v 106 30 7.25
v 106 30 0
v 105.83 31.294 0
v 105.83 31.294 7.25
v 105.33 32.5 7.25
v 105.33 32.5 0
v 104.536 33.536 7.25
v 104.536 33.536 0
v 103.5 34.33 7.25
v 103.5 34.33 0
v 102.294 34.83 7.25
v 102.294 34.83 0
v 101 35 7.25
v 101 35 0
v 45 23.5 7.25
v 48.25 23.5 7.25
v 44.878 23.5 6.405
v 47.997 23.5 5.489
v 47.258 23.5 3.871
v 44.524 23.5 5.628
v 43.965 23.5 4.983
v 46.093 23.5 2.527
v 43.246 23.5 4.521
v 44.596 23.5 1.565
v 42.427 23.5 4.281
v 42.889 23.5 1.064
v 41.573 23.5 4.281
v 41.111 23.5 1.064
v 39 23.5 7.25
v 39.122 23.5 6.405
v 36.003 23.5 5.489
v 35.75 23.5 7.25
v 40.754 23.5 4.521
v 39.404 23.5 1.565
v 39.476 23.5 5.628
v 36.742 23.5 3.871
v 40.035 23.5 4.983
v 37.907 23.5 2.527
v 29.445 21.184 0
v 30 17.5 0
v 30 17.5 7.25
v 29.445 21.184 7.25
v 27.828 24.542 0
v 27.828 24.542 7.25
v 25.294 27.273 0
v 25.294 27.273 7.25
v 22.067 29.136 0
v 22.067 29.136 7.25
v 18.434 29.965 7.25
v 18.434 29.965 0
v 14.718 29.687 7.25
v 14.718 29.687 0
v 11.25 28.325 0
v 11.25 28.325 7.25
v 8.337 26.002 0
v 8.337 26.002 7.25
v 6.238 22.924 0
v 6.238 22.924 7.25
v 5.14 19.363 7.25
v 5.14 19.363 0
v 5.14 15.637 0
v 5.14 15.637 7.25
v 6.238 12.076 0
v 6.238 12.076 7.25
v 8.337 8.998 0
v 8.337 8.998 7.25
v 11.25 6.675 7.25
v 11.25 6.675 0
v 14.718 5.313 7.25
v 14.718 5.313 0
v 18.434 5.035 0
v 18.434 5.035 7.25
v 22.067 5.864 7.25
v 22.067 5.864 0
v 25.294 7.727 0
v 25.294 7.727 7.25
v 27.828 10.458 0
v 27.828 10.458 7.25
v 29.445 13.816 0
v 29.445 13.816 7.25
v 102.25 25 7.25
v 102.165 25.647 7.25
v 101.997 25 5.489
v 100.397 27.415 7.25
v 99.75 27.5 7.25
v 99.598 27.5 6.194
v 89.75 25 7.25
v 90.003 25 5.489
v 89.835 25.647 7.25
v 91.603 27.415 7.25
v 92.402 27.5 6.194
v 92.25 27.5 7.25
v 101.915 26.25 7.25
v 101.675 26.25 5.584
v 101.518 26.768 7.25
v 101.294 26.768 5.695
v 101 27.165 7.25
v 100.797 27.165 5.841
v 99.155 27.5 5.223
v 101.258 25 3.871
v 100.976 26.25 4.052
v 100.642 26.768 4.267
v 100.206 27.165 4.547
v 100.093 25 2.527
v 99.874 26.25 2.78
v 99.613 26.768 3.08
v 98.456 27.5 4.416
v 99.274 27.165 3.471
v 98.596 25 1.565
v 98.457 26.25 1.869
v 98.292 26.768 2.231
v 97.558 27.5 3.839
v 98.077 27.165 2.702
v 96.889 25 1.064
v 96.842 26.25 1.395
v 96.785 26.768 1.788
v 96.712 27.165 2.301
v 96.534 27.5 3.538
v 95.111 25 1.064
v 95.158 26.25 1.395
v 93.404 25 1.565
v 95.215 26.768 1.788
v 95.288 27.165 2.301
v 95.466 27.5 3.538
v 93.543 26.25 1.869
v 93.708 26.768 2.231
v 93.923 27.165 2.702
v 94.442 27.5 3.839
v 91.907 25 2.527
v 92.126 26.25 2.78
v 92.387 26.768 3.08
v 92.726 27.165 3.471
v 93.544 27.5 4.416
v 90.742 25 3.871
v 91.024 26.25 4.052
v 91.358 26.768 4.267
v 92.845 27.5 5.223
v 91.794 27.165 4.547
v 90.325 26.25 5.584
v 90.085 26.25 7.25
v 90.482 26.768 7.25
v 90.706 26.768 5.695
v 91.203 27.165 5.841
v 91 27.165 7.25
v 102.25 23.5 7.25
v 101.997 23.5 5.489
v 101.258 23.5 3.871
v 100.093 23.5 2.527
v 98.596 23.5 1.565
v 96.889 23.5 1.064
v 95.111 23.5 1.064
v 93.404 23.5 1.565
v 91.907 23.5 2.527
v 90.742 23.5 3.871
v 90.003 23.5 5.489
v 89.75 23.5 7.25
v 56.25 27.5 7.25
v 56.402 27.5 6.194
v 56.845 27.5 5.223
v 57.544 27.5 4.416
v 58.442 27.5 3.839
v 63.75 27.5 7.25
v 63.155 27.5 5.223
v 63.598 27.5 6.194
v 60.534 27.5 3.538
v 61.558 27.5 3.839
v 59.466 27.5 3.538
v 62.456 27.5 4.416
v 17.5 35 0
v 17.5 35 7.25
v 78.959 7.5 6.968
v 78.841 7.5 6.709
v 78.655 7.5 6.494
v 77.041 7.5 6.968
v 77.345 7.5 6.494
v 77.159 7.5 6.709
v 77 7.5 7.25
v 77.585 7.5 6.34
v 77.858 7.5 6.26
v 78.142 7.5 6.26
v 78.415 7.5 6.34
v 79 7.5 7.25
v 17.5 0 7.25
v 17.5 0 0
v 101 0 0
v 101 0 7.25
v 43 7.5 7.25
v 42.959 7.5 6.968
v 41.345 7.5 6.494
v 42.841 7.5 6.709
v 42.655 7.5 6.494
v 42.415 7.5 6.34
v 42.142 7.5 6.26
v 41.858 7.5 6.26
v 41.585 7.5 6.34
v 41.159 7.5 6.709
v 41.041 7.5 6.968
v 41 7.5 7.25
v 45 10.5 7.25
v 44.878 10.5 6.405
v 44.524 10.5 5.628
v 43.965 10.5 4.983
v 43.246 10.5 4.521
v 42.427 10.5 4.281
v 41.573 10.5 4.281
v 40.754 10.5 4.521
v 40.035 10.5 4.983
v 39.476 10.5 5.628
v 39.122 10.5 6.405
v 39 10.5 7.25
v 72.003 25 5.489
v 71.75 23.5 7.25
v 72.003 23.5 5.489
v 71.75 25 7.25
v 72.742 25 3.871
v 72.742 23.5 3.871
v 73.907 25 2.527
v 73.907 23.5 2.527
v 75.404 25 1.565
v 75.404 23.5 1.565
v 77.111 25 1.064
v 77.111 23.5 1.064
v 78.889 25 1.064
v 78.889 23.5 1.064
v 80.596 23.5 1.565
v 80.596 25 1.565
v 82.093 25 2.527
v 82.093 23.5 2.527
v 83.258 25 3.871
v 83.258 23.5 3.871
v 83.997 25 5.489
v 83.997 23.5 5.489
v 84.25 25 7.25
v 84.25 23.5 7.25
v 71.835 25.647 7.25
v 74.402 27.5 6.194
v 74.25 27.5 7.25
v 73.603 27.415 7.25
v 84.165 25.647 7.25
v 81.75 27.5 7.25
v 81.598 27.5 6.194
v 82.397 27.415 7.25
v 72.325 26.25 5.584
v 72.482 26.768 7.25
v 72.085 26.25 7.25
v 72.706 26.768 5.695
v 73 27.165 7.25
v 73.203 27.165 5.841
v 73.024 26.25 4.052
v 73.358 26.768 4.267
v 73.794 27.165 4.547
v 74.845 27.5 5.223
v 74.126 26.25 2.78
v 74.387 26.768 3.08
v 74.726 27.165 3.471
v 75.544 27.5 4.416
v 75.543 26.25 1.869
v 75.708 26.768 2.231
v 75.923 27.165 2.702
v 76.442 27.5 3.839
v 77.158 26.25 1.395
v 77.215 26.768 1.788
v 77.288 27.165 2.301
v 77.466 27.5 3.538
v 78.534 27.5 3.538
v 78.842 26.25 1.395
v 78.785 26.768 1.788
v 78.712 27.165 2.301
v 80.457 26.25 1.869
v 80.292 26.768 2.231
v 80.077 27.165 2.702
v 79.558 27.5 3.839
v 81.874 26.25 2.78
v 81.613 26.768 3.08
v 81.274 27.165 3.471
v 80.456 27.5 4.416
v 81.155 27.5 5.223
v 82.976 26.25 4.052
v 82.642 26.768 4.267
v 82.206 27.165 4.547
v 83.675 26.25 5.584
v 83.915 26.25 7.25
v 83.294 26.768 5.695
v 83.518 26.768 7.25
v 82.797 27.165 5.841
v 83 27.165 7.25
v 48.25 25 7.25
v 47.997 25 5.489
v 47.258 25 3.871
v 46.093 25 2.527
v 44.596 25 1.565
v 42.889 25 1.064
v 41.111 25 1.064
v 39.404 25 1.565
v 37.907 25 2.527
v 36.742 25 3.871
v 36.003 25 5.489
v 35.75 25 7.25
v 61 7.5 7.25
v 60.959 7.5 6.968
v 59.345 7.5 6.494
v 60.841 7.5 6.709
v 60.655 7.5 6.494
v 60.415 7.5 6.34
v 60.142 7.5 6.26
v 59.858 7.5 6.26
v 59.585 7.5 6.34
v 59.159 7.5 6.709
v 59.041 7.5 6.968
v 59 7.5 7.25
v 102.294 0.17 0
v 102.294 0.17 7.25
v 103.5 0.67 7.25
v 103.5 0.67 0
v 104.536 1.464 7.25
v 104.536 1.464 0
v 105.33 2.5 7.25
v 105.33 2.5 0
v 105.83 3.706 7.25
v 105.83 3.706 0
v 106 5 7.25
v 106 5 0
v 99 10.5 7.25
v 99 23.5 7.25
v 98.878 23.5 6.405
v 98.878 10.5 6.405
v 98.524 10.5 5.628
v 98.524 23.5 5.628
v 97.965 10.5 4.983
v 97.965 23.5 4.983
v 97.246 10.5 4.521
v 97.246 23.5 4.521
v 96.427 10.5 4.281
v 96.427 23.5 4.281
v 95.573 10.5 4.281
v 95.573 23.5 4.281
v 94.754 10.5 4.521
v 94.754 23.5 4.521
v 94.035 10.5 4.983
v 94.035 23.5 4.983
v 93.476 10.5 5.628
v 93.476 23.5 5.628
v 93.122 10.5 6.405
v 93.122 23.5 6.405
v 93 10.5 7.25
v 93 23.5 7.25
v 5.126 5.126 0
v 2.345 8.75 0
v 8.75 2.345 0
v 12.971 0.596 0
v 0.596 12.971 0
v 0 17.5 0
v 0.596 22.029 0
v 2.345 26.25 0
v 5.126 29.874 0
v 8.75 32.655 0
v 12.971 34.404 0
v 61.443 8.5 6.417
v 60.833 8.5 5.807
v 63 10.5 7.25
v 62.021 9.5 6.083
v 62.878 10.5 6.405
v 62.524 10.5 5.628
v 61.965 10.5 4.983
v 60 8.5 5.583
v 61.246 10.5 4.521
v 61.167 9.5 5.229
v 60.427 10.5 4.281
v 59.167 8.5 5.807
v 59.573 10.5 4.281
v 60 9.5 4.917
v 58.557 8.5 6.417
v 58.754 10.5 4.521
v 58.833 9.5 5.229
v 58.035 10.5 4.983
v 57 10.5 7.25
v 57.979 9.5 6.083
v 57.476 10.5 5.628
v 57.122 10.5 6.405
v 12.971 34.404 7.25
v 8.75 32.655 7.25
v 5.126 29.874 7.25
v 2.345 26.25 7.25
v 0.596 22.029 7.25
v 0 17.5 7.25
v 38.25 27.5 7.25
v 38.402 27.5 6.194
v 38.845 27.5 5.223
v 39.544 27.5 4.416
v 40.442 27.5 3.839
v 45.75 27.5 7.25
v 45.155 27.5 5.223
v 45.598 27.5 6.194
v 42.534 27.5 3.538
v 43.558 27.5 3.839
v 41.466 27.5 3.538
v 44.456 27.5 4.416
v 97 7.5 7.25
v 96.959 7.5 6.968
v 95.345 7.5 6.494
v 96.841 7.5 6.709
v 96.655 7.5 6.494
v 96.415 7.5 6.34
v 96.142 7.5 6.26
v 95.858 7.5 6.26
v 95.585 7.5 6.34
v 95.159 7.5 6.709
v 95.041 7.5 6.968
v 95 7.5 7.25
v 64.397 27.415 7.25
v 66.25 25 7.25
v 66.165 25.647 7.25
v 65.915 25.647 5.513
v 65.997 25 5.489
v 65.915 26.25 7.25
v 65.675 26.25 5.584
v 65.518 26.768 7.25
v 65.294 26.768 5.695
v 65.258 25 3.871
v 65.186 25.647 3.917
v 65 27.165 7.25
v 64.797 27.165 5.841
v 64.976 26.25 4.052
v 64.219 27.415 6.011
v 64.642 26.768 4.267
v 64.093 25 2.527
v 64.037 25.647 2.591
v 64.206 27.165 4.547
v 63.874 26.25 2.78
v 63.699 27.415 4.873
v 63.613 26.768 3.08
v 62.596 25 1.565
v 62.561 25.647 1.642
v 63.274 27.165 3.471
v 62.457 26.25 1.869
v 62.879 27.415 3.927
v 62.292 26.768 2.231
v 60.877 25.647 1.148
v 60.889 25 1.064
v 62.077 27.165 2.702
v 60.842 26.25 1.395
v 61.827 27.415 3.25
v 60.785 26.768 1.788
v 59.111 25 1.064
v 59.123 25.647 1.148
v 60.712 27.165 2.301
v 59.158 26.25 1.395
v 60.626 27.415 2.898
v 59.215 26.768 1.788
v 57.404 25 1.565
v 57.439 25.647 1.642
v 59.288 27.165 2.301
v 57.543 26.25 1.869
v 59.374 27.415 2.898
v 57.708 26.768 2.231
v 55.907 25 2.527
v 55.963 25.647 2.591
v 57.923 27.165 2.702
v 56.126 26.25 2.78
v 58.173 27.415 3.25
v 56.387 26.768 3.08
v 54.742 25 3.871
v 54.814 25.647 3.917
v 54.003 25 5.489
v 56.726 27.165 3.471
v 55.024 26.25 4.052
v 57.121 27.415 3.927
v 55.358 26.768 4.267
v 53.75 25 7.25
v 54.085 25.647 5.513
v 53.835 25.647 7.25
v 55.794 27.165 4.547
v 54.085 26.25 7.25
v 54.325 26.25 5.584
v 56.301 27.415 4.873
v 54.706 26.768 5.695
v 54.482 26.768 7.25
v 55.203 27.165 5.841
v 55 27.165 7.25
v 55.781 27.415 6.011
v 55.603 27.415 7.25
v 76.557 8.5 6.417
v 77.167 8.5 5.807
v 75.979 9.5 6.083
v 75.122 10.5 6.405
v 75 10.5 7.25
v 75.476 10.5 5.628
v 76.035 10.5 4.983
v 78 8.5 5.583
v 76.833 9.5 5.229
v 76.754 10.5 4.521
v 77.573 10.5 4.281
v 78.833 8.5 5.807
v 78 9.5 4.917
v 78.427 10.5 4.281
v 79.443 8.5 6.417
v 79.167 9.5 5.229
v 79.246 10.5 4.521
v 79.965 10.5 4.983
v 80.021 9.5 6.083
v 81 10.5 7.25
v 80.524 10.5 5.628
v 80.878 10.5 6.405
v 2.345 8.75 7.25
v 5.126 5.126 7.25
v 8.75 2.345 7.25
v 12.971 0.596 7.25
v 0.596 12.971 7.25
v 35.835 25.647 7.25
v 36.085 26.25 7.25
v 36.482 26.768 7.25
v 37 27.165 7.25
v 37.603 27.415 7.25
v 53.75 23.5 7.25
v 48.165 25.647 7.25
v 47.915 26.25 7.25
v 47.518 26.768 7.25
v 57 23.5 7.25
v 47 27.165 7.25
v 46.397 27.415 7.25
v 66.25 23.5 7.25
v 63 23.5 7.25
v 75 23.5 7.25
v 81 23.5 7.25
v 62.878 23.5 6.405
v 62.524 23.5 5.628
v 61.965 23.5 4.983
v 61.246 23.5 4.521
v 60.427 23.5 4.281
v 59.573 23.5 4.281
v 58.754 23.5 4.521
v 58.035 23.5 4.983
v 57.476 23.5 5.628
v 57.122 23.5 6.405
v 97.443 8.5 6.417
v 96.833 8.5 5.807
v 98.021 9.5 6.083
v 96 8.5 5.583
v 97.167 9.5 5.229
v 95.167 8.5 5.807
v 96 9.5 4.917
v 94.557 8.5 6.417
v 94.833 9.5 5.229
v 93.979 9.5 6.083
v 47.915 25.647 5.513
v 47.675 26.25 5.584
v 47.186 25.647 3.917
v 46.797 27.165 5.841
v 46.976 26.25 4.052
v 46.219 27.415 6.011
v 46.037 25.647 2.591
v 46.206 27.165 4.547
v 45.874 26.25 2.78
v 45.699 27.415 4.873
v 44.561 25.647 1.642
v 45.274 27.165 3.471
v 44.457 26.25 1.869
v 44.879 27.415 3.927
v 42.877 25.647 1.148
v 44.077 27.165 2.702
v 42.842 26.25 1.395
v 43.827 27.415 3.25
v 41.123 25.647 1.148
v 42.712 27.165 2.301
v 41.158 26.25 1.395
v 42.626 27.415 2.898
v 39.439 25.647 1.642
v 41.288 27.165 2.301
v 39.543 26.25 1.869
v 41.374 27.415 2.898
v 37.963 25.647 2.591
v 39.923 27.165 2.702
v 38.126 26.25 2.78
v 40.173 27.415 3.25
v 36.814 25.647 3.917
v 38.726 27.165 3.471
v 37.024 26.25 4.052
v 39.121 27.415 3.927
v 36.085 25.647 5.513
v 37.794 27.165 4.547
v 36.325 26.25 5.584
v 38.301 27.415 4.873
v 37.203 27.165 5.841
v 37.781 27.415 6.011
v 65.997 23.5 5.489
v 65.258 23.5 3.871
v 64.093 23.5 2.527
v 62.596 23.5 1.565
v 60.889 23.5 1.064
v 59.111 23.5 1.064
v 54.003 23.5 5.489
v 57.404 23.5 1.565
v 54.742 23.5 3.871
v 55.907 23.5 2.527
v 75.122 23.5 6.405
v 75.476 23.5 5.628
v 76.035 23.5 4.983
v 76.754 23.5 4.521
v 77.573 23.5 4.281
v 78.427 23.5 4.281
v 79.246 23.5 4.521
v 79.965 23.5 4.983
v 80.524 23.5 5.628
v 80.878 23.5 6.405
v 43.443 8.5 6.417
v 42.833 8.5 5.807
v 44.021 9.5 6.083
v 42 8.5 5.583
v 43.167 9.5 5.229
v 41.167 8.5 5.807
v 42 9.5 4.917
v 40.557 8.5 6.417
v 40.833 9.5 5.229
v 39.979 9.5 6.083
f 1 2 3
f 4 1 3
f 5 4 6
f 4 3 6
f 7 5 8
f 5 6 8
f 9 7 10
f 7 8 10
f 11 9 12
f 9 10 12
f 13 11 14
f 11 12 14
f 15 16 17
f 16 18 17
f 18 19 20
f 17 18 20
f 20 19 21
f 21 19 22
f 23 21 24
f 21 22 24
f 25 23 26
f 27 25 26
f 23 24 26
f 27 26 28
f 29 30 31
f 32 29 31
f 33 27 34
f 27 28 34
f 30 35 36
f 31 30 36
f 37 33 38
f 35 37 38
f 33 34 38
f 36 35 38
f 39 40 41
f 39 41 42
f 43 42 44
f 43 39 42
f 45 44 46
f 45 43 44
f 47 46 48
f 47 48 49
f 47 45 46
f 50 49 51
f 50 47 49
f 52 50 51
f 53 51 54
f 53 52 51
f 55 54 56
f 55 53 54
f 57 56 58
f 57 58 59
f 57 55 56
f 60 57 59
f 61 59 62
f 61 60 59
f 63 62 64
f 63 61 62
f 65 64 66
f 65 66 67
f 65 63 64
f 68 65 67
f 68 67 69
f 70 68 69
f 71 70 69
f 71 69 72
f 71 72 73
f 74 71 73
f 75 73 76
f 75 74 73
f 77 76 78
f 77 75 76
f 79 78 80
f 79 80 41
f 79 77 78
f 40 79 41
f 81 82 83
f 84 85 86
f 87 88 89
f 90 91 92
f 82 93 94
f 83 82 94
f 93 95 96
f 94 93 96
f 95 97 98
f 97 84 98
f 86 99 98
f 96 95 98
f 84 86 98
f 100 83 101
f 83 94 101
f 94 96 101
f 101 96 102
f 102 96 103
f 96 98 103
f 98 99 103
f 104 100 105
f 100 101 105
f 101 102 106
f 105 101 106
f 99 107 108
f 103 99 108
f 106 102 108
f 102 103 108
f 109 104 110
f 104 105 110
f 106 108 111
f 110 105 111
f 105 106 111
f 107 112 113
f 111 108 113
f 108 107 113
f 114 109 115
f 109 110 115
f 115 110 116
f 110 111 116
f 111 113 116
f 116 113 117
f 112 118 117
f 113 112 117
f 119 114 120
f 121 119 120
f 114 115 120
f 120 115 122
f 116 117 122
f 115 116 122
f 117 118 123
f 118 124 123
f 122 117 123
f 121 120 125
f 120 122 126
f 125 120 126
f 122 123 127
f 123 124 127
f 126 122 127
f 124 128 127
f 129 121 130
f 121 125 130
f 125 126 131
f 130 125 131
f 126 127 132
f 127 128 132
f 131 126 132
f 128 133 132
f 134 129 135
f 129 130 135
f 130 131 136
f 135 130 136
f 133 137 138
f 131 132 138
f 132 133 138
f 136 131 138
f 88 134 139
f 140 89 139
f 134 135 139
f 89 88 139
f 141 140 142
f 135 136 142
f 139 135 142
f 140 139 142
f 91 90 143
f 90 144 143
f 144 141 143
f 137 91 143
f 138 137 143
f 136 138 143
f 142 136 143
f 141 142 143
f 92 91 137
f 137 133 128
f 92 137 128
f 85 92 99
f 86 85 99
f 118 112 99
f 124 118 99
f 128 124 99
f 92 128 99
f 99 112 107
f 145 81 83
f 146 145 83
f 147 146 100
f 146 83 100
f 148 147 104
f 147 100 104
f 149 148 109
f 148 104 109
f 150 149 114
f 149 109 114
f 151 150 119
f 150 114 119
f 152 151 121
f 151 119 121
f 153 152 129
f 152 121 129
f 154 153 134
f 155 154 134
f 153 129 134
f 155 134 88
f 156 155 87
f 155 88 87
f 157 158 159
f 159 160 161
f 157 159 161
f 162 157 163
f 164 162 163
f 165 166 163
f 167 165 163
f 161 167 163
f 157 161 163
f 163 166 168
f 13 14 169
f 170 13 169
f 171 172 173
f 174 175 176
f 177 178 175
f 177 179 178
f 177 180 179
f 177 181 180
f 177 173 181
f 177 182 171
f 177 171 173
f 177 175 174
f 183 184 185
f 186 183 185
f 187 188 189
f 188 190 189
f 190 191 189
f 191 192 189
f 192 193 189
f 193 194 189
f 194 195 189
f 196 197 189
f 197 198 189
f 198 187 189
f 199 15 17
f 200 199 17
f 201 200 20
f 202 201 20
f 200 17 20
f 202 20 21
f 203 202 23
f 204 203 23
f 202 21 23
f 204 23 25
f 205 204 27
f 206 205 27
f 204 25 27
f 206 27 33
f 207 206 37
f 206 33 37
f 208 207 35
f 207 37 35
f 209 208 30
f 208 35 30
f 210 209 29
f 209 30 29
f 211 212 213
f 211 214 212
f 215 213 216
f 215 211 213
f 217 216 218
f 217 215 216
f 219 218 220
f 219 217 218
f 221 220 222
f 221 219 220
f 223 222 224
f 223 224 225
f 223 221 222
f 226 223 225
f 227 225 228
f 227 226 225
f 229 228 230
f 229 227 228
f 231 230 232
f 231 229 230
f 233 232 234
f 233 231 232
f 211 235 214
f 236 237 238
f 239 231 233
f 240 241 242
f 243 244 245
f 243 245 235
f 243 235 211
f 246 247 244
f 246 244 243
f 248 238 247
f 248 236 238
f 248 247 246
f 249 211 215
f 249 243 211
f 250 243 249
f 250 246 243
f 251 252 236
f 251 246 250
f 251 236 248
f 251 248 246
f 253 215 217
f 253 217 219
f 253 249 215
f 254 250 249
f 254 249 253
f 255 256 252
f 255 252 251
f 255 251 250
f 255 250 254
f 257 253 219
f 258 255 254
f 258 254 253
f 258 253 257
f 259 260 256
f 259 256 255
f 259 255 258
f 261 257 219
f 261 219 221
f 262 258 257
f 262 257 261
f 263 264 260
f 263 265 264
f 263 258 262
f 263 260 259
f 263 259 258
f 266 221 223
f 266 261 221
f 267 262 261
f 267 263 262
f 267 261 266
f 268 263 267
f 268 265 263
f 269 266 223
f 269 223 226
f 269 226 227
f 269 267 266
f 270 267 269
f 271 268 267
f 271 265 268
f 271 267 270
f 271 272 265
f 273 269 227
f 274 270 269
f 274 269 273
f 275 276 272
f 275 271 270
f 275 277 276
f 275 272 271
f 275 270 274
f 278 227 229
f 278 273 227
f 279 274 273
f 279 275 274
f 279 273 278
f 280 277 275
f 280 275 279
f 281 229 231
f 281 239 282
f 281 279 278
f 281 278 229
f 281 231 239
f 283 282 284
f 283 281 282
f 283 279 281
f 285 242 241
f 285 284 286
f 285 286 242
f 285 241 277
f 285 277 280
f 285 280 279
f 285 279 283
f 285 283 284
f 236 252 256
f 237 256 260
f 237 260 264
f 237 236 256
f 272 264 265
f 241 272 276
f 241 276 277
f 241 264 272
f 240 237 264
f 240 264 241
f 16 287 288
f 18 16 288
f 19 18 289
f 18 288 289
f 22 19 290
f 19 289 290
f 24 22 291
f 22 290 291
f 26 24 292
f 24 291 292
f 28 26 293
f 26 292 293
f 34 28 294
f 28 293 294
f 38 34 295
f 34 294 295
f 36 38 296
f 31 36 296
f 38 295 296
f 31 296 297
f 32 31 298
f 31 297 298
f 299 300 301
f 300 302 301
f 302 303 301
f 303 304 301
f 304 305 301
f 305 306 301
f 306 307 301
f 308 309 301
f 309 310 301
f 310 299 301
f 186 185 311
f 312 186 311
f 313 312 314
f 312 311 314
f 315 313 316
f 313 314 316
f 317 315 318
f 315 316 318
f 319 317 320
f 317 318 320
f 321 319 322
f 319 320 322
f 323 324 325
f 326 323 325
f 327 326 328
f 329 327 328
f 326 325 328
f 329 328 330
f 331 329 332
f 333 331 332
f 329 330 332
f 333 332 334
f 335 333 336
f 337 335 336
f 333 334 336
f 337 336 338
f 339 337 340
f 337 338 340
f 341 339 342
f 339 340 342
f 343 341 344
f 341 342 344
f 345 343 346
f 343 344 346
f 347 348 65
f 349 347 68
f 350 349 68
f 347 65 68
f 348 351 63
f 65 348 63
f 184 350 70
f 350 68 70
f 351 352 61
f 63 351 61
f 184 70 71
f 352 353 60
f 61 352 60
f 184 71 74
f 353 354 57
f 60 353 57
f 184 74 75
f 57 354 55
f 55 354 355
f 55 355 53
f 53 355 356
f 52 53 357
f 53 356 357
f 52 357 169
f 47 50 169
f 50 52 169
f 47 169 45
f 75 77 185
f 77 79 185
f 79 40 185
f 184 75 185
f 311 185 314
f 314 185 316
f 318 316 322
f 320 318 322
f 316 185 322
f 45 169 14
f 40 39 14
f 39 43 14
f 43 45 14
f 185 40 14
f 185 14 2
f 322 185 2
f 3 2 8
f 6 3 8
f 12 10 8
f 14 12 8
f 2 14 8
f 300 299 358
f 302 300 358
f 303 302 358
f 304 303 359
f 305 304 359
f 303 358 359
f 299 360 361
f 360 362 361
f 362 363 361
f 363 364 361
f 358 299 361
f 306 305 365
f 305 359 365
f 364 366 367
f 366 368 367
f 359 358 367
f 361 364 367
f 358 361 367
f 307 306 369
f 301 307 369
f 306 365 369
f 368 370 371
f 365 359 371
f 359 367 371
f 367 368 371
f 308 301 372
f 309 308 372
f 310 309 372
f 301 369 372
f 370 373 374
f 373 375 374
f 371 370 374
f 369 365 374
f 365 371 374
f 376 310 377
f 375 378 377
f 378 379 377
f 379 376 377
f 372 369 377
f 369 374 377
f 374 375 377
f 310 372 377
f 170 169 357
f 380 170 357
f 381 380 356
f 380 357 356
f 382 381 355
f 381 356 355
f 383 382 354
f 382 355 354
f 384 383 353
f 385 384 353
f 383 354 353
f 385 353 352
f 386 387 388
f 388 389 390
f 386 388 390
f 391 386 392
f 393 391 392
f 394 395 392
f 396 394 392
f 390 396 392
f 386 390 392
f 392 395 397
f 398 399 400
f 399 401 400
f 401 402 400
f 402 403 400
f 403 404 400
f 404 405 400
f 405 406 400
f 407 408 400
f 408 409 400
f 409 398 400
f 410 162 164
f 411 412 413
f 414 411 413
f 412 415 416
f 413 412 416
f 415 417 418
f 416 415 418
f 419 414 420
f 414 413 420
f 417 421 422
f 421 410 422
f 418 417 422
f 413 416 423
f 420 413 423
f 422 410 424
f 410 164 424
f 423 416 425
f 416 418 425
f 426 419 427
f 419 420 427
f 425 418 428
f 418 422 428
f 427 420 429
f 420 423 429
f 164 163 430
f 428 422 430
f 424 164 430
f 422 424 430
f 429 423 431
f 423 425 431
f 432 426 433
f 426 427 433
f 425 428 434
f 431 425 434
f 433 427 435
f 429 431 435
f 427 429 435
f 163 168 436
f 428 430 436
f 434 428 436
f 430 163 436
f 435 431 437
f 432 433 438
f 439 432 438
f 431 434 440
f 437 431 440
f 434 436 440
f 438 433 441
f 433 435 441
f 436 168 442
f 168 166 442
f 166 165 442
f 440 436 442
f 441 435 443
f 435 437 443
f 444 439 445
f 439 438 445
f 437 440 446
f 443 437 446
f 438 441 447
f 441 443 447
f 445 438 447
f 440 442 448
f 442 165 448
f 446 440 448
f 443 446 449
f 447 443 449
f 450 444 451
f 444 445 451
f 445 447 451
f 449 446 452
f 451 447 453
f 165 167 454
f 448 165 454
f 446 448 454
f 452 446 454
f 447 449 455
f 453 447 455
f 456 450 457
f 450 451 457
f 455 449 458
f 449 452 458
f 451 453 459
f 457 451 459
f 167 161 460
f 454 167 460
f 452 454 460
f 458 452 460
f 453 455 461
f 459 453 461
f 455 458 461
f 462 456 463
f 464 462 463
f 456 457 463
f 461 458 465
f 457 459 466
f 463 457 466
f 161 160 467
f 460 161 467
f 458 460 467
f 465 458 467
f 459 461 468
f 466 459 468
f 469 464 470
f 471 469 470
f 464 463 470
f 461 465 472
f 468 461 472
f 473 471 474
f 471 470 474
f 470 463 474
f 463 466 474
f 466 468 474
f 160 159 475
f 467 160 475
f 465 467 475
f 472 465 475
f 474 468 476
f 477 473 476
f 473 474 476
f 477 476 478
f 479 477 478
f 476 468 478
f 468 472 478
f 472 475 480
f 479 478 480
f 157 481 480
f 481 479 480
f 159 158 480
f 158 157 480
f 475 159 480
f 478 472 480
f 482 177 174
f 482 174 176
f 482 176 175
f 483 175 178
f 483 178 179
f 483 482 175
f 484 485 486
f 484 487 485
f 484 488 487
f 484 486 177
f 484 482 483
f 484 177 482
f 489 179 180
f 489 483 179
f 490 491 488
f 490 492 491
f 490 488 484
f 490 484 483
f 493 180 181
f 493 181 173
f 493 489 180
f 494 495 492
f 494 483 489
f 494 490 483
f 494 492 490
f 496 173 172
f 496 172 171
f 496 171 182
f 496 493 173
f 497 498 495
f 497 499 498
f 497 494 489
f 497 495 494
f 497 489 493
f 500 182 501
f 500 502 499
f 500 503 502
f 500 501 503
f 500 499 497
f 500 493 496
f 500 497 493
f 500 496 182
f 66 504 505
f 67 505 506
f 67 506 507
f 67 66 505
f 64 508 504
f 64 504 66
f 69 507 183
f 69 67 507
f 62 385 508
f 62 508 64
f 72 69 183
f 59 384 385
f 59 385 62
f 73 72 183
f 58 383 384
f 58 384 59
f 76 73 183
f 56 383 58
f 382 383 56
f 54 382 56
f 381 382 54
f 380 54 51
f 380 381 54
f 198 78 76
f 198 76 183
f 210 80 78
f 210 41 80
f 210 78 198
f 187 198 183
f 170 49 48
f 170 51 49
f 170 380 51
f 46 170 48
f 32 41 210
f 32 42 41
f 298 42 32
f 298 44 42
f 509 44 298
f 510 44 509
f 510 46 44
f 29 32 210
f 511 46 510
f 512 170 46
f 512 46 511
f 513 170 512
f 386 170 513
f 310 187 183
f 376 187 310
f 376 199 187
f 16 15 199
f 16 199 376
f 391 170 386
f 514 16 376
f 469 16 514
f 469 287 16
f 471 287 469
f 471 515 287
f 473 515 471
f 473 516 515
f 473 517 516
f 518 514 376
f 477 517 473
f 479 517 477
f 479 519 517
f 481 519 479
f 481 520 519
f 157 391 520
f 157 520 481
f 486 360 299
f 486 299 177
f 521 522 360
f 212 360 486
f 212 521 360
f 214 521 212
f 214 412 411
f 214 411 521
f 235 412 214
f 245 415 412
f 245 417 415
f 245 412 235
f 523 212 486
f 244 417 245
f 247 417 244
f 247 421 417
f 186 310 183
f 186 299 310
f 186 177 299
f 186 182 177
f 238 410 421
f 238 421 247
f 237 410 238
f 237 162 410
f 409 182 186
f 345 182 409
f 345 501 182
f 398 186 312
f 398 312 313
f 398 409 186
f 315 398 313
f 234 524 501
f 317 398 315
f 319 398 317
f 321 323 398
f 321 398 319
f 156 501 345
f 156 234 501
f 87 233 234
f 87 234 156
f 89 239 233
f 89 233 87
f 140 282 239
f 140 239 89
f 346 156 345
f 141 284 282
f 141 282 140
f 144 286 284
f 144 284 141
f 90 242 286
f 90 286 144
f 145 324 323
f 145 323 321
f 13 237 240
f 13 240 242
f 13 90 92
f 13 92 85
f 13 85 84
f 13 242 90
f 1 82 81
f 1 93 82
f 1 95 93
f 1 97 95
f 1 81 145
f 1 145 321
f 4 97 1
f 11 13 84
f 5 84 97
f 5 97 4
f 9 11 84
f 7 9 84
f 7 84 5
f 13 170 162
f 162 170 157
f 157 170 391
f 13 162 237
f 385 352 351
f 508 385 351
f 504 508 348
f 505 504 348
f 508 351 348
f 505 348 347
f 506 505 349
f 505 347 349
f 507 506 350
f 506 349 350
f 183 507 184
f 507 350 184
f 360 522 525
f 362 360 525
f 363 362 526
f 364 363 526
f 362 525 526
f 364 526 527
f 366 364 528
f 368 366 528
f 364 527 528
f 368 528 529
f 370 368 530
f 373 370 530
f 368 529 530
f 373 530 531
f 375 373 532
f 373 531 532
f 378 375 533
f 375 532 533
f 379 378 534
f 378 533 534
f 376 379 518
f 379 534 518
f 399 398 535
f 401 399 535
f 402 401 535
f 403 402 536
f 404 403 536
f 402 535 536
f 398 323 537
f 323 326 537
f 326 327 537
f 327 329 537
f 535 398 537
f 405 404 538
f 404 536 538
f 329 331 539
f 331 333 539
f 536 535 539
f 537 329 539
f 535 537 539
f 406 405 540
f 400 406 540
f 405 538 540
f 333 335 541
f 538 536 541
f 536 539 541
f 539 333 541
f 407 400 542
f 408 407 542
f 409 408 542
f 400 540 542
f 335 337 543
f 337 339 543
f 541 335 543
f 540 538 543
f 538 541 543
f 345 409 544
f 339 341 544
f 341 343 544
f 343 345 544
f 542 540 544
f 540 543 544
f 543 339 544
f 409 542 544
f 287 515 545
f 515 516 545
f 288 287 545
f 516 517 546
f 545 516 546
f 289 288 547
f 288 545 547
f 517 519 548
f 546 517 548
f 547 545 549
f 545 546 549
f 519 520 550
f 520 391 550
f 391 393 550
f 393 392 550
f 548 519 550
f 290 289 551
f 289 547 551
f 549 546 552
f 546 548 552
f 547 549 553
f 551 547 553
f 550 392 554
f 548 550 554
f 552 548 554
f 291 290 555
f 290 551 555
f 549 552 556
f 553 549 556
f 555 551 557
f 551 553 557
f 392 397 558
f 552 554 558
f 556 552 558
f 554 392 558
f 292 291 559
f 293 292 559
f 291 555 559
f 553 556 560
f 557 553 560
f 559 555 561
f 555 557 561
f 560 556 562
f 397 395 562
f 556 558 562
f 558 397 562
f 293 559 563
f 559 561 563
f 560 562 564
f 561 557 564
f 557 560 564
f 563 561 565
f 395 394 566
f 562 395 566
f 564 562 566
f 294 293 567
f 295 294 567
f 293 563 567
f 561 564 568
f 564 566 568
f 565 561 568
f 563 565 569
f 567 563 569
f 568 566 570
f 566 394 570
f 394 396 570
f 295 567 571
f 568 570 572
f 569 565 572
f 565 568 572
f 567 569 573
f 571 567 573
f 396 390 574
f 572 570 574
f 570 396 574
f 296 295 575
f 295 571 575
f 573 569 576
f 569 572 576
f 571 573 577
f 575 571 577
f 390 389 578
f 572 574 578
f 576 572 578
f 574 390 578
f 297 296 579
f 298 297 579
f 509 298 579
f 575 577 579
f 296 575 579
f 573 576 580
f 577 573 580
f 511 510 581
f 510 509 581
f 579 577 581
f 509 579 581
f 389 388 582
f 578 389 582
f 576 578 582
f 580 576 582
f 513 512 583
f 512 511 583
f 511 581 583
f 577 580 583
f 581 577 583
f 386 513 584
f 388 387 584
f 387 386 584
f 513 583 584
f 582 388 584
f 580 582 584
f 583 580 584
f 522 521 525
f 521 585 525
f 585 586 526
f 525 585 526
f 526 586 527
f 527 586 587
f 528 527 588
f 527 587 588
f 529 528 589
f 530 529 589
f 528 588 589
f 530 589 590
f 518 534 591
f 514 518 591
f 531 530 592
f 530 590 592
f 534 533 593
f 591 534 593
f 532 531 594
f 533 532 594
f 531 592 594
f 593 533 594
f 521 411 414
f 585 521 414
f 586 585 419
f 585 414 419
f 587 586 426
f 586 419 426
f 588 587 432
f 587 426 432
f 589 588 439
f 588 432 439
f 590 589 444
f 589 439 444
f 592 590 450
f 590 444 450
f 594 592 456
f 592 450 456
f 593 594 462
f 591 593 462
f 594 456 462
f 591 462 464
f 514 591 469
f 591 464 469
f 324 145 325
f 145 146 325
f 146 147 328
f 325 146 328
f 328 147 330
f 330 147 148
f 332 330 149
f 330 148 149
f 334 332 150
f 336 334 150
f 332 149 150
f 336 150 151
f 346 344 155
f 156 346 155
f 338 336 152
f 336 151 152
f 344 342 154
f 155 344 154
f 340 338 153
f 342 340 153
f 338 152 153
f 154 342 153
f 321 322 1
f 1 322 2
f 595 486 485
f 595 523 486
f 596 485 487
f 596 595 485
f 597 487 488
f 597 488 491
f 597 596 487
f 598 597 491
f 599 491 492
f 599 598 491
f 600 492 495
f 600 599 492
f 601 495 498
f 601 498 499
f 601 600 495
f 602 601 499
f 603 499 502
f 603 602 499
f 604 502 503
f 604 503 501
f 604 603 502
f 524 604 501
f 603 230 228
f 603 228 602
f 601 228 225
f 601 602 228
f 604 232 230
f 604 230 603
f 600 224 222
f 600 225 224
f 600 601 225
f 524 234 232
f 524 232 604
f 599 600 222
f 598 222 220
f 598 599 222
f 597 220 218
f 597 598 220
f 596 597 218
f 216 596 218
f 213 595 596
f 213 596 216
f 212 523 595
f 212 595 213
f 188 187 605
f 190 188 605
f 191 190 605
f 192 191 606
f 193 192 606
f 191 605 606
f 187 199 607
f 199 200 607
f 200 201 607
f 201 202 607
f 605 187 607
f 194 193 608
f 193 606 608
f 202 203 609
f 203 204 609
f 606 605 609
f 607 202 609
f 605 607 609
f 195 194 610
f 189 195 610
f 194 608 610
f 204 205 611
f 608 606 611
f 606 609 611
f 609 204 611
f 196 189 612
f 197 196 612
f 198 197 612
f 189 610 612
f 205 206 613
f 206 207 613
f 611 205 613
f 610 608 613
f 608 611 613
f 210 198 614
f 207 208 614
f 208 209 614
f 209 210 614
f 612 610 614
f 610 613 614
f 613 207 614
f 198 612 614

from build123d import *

# Parameters (mm, degrees)
F0_R     = 12.5
F1_DEPTH = 7.25


with BuildPart() as f1:
    # F0 (on Top) → F1 (new body)
    with BuildSketch(Plane.XY):
        with BuildLine():
            ThreePointArc((0, 17.5), (5.125631, 5.125631), (17.5, 0))
            Line((17.5, 0), (101, 0))
            ThreePointArc((101, 0), (104.535534, 1.464466), (106, 5))
            Line((106, 5), (106, 30))
            ThreePointArc((106, 30), (104.535534, 33.535534), (101, 35))
            Line((101, 35), (17.5, 35))
            ThreePointArc((17.5, 35), (5.125631, 29.874369), (0, 17.5))
        make_face()
        with Locations((17.5, 17.5)):
            Circle(F0_R, mode=Mode.SUBTRACT)
    extrude(amount=F1_DEPTH)

    # F2 (on face) → F3 (revolve, cut)
    with BuildSketch(Plane.XY.offset(7.25)):
        with BuildLine():
            Line((42, 10.5), (42, 7.5))
            Line((42, 7.5), (43, 7.5))
            Line((43, 7.5), (45, 10.5))
            Line((45, 10.5), (45, 23.5))
            Line((45, 23.5), (48.25, 23.5))
            Line((48.25, 23.5), (48.25, 25))
            ThreePointArc((48.25, 25), (47.517767, 26.767767), (45.75, 27.5))
            Line((45.75, 27.5), (42, 27.5))
            Line((42, 27.5), (42, 23.5))
            Line((42, 23.5), (42, 10.5))
        make_face()
    revolve(axis=Axis((42, 15.5, 7.25), (0, 1, 0)), mode=Mode.SUBTRACT)

    # F2 (on face) → F4 (revolve, cut)
    with BuildSketch(Plane.XY.offset(7.25)):
        with BuildLine():
            Line((60, 10.5), (60, 7.5))
            Line((60, 7.5), (61, 7.5))
            Line((61, 7.5), (63, 10.5))
            Line((63, 10.5), (63, 23.5))
            Line((63, 23.5), (66.25, 23.5))
            Line((66.25, 23.5), (66.25, 25))
            ThreePointArc((66.25, 25), (65.517767, 26.767767), (63.75, 27.5))
            Line((63.75, 27.5), (60, 27.5))
            Line((60, 27.5), (60, 23.5))
            Line((60, 23.5), (60, 10.5))
        make_face()
    revolve(axis=Axis((60, 15.5, 7.25), (0, 1, 0)), mode=Mode.SUBTRACT)

    # F2 (on face) → F5 (revolve, cut)
    with BuildSketch(Plane.XY.offset(7.25)):
        with BuildLine():
            Line((78, 10.5), (78, 7.5))
            Line((78, 7.5), (79, 7.5))
            Line((79, 7.5), (81, 10.5))
            Line((81, 10.5), (81, 23.5))
            Line((81, 23.5), (84.25, 23.5))
            Line((84.25, 23.5), (84.25, 25))
            ThreePointArc((84.25, 25), (83.517767, 26.767767), (81.75, 27.5))
            Line((81.75, 27.5), (78, 27.5))
            Line((78, 27.5), (78, 23.5))
            Line((78, 23.5), (78, 10.5))
        make_face()
    revolve(axis=Axis((78, 17, 7.25), (0, -1, 0)), mode=Mode.SUBTRACT)

    # F2 (on face) → F6 (revolve, cut)
    with BuildSketch(Plane.XY.offset(7.25)):
        with BuildLine():
            Line((96, 10.5), (96, 7.5))
            Line((96, 7.5), (97, 7.5))
            Line((97, 7.5), (99, 10.5))
            Line((99, 10.5), (99, 23.5))
            Line((99, 23.5), (102.25, 23.5))
            Line((102.25, 23.5), (102.25, 25))
            ThreePointArc((102.25, 25), (101.517767, 26.767767), (99.75, 27.5))
            Line((99.75, 27.5), (96, 27.5))
            Line((96, 27.5), (96, 23.5))
            Line((96, 23.5), (96, 10.5))
        make_face()
    revolve(axis=Axis((96, 15.5, 7.25), (0, 1, 0)), mode=Mode.SUBTRACT)


solid = f1.part
